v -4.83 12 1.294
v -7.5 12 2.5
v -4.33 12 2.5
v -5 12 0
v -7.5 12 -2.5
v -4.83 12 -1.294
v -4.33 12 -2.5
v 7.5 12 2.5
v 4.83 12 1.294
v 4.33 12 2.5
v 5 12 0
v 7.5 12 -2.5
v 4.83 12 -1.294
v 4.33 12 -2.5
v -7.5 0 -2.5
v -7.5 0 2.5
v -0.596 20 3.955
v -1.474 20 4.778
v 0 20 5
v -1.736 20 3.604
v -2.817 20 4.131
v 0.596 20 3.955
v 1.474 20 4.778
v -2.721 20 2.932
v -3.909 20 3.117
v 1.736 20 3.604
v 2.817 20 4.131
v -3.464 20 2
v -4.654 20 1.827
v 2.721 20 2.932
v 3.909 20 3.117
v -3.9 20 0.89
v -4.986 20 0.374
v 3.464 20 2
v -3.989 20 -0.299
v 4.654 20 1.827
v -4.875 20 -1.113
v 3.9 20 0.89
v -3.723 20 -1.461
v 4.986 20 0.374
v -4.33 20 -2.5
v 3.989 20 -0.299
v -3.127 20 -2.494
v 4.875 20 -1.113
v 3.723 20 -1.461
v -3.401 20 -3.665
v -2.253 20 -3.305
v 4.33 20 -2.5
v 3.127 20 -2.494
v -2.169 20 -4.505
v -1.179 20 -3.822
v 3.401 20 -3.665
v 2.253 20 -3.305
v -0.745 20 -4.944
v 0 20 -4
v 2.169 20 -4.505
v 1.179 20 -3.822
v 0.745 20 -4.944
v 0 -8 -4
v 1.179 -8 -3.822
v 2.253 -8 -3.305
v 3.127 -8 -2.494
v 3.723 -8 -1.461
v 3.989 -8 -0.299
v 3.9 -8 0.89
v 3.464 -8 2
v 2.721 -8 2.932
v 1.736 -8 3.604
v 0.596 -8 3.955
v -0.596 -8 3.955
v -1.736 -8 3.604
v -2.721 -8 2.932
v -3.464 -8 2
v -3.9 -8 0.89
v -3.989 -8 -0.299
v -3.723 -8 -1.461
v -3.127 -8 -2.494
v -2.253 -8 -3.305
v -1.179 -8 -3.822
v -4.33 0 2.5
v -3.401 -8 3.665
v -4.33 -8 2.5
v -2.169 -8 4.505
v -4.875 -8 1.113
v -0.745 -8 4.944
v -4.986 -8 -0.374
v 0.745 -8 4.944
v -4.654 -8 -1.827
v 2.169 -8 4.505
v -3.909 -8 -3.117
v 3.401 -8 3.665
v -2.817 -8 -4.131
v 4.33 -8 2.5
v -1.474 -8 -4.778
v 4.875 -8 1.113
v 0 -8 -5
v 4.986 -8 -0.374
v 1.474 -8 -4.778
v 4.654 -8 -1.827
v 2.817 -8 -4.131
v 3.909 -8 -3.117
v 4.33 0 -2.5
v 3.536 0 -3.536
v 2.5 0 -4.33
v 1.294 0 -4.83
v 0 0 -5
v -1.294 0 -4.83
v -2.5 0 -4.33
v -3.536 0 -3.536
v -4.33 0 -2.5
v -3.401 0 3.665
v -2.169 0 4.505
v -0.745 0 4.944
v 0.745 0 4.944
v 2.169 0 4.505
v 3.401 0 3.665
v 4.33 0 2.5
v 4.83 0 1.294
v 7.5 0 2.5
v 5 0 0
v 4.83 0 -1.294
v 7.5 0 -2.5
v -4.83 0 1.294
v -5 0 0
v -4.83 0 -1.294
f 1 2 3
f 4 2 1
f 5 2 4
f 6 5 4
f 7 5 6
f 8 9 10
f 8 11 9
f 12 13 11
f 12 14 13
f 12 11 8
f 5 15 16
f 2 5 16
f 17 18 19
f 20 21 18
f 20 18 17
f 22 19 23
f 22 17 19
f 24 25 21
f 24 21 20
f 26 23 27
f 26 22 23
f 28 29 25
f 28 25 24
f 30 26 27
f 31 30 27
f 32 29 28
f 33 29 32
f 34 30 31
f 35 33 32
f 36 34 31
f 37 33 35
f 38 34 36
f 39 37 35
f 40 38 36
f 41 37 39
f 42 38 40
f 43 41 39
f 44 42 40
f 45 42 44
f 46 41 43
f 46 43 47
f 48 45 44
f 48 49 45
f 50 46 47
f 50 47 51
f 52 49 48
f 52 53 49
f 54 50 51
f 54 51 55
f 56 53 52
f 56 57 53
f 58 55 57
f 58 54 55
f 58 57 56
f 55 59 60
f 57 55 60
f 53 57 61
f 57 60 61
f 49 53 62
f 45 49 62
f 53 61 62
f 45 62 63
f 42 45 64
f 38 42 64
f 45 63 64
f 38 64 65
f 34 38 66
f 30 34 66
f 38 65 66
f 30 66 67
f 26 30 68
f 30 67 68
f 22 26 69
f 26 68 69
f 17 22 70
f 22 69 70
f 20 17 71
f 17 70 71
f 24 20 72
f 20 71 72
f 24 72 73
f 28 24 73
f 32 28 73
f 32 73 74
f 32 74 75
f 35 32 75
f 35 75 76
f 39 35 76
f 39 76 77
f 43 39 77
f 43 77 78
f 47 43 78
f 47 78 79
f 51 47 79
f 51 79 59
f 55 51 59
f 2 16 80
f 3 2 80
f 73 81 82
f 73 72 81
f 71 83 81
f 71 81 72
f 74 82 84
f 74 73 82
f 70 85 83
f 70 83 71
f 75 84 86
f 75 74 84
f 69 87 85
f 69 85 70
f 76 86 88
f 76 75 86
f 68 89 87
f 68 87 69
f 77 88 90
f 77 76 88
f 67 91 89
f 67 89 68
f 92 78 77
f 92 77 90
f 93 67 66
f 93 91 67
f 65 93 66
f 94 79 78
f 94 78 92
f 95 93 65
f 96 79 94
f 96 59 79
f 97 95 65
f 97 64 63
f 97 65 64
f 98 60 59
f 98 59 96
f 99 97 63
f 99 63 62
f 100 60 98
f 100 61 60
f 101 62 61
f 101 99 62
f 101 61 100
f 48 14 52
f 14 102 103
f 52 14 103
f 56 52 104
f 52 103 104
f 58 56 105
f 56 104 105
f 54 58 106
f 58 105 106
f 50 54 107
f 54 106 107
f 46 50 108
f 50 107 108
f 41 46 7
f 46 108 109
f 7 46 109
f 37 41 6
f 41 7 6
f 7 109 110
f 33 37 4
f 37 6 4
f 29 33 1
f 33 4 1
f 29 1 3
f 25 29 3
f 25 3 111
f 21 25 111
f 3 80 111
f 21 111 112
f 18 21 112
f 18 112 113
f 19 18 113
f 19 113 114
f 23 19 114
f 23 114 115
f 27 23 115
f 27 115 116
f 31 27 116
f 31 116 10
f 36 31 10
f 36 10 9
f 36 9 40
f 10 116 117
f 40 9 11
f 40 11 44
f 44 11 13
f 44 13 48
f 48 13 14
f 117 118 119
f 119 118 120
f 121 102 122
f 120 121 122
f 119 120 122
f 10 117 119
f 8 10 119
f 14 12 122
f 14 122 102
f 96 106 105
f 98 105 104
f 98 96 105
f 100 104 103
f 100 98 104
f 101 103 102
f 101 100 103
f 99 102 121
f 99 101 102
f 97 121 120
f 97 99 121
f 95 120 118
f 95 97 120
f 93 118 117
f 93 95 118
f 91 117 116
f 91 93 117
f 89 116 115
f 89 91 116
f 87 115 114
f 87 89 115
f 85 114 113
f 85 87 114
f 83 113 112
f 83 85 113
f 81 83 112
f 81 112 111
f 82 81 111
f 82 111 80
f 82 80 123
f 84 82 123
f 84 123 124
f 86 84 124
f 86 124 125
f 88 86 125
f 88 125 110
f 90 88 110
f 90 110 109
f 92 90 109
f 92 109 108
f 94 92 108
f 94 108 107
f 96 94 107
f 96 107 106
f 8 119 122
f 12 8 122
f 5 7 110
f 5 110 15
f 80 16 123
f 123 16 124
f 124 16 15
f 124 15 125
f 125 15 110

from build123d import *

# Parameters (mm, degrees)
BOSS_EXTRUDE1_DEPTH = 12
SKETCH2_R           = 5
BOSS_EXTRUDE2_DEPTH = 8
BOSS_EXTRUDE3_START = 8
SKETCH3_R           = 5
BOSS_EXTRUDE3_DEPTH = 8
SKETCH4_R           = 4
CUT_EXTRUDE1_DEPTH  = 30.415132160165456


with BuildPart() as part:
    # Sketch1 → Boss-Extrude1 (new body)
    with BuildSketch(Plane(origin=(0, 0, 0), x_dir=(1, 0, 0), z_dir=(0, 1, 0))):
        with BuildLine():
            Line((-4.330127018922256, 2.4999999999999996), (-7.499999999999998, 2.4999999999999996))
            Line((-7.499999999999998, 2.4999999999999996), (-7.499999999999998, -2.5000000000000004))
            Line((-7.499999999999998, -2.5000000000000004), (-4.330127018922255, -2.5000000000000004))
            ThreePointArc((-4.330127018922232, -2.4999999999999334), (-5, 6.1e-16), (-4.330127018922233, 2.4999999999999325))
        make_face()
        with BuildLine():
            ThreePointArc((4.330127018922173, 2.5000000000000346), (-5.965e-14, 5), (-4.330127018922233, 2.4999999999999325))
            Line((-4.330127018922256, 2.4999999999999996), (4.330127018922161, 2.4999999999999996))
        make_face()
        with BuildLine():
            Line((4.330127018922161, 2.4999999999999996), (-4.330127018922256, 2.4999999999999996))
            ThreePointArc((-4.330127018922233, 2.4999999999999325), (-5, 6.1e-16), (-4.330127018922232, -2.4999999999999334))
            Line((-4.330127018922255, -2.5000000000000004), (4.330127018922159, -2.5000000000000004))
            ThreePointArc((4.3301270189221714, -2.5000000000000364), (4.829629131445336, -1.294095225512625), (5, -1.22e-15))
            ThreePointArc((5, 0), (4.829629131445337, 1.2940952255126228), (4.330127018922173, 2.5000000000000346))
        make_face()
        with BuildLine():
            Line((7.500000000000002, 2.4999999999999996), (4.330127018922161, 2.4999999999999996))
            ThreePointArc((4.330127018922173, 2.5000000000000346), (4.829629131445337, 1.2940952255126228), (5, 0))
            ThreePointArc((5, -1.22e-15), (4.829629131445336, -1.294095225512625), (4.3301270189221714, -2.5000000000000364))
            Line((4.330127018922159, -2.5000000000000004), (7.500000000000002, -2.5000000000000004))
            Line((7.500000000000002, -2.5000000000000004), (7.500000000000002, 2.4999999999999996))
        make_face()
        with BuildLine():
            Line((4.330127018922159, -2.5000000000000004), (-4.330127018922255, -2.5000000000000004))
            ThreePointArc((-4.330127018922232, -2.4999999999999334), (-5.865e-14, -5), (4.3301270189221714, -2.5000000000000364))
        make_face()
    extrude(amount=BOSS_EXTRUDE1_DEPTH)

    # Sketch2 → Boss-Extrude2 (add)
    with BuildSketch(Plane(origin=(0, 12, 0), x_dir=(1, 0, 0), z_dir=(0, 1, 0))):
        with Locations(Location((0, 0, 0), (0, 0, 30))):
            Circle(SKETCH2_R)
    extrude(amount=BOSS_EXTRUDE2_DEPTH)

    # Sketch3 → Boss-Extrude3 (add)
    with BuildSketch(Plane.XZ.offset(BOSS_EXTRUDE3_START)):
        with Locations(Location((0, 0, 0), (0, 0, 270))):
            Circle(SKETCH3_R)
    extrude(amount=-BOSS_EXTRUDE3_DEPTH)

    # Sketch4 → Cut-Extrude1 (cut, through all)
    with BuildSketch(Plane.XZ.offset(8)):
        with Locations(Location((0, 0, 0), (0, 0, 270))):
            Circle(SKETCH4_R)
    extrude(amount=-CUT_EXTRUDE1_DEPTH, mode=Mode.SUBTRACT)


solid = part.part
